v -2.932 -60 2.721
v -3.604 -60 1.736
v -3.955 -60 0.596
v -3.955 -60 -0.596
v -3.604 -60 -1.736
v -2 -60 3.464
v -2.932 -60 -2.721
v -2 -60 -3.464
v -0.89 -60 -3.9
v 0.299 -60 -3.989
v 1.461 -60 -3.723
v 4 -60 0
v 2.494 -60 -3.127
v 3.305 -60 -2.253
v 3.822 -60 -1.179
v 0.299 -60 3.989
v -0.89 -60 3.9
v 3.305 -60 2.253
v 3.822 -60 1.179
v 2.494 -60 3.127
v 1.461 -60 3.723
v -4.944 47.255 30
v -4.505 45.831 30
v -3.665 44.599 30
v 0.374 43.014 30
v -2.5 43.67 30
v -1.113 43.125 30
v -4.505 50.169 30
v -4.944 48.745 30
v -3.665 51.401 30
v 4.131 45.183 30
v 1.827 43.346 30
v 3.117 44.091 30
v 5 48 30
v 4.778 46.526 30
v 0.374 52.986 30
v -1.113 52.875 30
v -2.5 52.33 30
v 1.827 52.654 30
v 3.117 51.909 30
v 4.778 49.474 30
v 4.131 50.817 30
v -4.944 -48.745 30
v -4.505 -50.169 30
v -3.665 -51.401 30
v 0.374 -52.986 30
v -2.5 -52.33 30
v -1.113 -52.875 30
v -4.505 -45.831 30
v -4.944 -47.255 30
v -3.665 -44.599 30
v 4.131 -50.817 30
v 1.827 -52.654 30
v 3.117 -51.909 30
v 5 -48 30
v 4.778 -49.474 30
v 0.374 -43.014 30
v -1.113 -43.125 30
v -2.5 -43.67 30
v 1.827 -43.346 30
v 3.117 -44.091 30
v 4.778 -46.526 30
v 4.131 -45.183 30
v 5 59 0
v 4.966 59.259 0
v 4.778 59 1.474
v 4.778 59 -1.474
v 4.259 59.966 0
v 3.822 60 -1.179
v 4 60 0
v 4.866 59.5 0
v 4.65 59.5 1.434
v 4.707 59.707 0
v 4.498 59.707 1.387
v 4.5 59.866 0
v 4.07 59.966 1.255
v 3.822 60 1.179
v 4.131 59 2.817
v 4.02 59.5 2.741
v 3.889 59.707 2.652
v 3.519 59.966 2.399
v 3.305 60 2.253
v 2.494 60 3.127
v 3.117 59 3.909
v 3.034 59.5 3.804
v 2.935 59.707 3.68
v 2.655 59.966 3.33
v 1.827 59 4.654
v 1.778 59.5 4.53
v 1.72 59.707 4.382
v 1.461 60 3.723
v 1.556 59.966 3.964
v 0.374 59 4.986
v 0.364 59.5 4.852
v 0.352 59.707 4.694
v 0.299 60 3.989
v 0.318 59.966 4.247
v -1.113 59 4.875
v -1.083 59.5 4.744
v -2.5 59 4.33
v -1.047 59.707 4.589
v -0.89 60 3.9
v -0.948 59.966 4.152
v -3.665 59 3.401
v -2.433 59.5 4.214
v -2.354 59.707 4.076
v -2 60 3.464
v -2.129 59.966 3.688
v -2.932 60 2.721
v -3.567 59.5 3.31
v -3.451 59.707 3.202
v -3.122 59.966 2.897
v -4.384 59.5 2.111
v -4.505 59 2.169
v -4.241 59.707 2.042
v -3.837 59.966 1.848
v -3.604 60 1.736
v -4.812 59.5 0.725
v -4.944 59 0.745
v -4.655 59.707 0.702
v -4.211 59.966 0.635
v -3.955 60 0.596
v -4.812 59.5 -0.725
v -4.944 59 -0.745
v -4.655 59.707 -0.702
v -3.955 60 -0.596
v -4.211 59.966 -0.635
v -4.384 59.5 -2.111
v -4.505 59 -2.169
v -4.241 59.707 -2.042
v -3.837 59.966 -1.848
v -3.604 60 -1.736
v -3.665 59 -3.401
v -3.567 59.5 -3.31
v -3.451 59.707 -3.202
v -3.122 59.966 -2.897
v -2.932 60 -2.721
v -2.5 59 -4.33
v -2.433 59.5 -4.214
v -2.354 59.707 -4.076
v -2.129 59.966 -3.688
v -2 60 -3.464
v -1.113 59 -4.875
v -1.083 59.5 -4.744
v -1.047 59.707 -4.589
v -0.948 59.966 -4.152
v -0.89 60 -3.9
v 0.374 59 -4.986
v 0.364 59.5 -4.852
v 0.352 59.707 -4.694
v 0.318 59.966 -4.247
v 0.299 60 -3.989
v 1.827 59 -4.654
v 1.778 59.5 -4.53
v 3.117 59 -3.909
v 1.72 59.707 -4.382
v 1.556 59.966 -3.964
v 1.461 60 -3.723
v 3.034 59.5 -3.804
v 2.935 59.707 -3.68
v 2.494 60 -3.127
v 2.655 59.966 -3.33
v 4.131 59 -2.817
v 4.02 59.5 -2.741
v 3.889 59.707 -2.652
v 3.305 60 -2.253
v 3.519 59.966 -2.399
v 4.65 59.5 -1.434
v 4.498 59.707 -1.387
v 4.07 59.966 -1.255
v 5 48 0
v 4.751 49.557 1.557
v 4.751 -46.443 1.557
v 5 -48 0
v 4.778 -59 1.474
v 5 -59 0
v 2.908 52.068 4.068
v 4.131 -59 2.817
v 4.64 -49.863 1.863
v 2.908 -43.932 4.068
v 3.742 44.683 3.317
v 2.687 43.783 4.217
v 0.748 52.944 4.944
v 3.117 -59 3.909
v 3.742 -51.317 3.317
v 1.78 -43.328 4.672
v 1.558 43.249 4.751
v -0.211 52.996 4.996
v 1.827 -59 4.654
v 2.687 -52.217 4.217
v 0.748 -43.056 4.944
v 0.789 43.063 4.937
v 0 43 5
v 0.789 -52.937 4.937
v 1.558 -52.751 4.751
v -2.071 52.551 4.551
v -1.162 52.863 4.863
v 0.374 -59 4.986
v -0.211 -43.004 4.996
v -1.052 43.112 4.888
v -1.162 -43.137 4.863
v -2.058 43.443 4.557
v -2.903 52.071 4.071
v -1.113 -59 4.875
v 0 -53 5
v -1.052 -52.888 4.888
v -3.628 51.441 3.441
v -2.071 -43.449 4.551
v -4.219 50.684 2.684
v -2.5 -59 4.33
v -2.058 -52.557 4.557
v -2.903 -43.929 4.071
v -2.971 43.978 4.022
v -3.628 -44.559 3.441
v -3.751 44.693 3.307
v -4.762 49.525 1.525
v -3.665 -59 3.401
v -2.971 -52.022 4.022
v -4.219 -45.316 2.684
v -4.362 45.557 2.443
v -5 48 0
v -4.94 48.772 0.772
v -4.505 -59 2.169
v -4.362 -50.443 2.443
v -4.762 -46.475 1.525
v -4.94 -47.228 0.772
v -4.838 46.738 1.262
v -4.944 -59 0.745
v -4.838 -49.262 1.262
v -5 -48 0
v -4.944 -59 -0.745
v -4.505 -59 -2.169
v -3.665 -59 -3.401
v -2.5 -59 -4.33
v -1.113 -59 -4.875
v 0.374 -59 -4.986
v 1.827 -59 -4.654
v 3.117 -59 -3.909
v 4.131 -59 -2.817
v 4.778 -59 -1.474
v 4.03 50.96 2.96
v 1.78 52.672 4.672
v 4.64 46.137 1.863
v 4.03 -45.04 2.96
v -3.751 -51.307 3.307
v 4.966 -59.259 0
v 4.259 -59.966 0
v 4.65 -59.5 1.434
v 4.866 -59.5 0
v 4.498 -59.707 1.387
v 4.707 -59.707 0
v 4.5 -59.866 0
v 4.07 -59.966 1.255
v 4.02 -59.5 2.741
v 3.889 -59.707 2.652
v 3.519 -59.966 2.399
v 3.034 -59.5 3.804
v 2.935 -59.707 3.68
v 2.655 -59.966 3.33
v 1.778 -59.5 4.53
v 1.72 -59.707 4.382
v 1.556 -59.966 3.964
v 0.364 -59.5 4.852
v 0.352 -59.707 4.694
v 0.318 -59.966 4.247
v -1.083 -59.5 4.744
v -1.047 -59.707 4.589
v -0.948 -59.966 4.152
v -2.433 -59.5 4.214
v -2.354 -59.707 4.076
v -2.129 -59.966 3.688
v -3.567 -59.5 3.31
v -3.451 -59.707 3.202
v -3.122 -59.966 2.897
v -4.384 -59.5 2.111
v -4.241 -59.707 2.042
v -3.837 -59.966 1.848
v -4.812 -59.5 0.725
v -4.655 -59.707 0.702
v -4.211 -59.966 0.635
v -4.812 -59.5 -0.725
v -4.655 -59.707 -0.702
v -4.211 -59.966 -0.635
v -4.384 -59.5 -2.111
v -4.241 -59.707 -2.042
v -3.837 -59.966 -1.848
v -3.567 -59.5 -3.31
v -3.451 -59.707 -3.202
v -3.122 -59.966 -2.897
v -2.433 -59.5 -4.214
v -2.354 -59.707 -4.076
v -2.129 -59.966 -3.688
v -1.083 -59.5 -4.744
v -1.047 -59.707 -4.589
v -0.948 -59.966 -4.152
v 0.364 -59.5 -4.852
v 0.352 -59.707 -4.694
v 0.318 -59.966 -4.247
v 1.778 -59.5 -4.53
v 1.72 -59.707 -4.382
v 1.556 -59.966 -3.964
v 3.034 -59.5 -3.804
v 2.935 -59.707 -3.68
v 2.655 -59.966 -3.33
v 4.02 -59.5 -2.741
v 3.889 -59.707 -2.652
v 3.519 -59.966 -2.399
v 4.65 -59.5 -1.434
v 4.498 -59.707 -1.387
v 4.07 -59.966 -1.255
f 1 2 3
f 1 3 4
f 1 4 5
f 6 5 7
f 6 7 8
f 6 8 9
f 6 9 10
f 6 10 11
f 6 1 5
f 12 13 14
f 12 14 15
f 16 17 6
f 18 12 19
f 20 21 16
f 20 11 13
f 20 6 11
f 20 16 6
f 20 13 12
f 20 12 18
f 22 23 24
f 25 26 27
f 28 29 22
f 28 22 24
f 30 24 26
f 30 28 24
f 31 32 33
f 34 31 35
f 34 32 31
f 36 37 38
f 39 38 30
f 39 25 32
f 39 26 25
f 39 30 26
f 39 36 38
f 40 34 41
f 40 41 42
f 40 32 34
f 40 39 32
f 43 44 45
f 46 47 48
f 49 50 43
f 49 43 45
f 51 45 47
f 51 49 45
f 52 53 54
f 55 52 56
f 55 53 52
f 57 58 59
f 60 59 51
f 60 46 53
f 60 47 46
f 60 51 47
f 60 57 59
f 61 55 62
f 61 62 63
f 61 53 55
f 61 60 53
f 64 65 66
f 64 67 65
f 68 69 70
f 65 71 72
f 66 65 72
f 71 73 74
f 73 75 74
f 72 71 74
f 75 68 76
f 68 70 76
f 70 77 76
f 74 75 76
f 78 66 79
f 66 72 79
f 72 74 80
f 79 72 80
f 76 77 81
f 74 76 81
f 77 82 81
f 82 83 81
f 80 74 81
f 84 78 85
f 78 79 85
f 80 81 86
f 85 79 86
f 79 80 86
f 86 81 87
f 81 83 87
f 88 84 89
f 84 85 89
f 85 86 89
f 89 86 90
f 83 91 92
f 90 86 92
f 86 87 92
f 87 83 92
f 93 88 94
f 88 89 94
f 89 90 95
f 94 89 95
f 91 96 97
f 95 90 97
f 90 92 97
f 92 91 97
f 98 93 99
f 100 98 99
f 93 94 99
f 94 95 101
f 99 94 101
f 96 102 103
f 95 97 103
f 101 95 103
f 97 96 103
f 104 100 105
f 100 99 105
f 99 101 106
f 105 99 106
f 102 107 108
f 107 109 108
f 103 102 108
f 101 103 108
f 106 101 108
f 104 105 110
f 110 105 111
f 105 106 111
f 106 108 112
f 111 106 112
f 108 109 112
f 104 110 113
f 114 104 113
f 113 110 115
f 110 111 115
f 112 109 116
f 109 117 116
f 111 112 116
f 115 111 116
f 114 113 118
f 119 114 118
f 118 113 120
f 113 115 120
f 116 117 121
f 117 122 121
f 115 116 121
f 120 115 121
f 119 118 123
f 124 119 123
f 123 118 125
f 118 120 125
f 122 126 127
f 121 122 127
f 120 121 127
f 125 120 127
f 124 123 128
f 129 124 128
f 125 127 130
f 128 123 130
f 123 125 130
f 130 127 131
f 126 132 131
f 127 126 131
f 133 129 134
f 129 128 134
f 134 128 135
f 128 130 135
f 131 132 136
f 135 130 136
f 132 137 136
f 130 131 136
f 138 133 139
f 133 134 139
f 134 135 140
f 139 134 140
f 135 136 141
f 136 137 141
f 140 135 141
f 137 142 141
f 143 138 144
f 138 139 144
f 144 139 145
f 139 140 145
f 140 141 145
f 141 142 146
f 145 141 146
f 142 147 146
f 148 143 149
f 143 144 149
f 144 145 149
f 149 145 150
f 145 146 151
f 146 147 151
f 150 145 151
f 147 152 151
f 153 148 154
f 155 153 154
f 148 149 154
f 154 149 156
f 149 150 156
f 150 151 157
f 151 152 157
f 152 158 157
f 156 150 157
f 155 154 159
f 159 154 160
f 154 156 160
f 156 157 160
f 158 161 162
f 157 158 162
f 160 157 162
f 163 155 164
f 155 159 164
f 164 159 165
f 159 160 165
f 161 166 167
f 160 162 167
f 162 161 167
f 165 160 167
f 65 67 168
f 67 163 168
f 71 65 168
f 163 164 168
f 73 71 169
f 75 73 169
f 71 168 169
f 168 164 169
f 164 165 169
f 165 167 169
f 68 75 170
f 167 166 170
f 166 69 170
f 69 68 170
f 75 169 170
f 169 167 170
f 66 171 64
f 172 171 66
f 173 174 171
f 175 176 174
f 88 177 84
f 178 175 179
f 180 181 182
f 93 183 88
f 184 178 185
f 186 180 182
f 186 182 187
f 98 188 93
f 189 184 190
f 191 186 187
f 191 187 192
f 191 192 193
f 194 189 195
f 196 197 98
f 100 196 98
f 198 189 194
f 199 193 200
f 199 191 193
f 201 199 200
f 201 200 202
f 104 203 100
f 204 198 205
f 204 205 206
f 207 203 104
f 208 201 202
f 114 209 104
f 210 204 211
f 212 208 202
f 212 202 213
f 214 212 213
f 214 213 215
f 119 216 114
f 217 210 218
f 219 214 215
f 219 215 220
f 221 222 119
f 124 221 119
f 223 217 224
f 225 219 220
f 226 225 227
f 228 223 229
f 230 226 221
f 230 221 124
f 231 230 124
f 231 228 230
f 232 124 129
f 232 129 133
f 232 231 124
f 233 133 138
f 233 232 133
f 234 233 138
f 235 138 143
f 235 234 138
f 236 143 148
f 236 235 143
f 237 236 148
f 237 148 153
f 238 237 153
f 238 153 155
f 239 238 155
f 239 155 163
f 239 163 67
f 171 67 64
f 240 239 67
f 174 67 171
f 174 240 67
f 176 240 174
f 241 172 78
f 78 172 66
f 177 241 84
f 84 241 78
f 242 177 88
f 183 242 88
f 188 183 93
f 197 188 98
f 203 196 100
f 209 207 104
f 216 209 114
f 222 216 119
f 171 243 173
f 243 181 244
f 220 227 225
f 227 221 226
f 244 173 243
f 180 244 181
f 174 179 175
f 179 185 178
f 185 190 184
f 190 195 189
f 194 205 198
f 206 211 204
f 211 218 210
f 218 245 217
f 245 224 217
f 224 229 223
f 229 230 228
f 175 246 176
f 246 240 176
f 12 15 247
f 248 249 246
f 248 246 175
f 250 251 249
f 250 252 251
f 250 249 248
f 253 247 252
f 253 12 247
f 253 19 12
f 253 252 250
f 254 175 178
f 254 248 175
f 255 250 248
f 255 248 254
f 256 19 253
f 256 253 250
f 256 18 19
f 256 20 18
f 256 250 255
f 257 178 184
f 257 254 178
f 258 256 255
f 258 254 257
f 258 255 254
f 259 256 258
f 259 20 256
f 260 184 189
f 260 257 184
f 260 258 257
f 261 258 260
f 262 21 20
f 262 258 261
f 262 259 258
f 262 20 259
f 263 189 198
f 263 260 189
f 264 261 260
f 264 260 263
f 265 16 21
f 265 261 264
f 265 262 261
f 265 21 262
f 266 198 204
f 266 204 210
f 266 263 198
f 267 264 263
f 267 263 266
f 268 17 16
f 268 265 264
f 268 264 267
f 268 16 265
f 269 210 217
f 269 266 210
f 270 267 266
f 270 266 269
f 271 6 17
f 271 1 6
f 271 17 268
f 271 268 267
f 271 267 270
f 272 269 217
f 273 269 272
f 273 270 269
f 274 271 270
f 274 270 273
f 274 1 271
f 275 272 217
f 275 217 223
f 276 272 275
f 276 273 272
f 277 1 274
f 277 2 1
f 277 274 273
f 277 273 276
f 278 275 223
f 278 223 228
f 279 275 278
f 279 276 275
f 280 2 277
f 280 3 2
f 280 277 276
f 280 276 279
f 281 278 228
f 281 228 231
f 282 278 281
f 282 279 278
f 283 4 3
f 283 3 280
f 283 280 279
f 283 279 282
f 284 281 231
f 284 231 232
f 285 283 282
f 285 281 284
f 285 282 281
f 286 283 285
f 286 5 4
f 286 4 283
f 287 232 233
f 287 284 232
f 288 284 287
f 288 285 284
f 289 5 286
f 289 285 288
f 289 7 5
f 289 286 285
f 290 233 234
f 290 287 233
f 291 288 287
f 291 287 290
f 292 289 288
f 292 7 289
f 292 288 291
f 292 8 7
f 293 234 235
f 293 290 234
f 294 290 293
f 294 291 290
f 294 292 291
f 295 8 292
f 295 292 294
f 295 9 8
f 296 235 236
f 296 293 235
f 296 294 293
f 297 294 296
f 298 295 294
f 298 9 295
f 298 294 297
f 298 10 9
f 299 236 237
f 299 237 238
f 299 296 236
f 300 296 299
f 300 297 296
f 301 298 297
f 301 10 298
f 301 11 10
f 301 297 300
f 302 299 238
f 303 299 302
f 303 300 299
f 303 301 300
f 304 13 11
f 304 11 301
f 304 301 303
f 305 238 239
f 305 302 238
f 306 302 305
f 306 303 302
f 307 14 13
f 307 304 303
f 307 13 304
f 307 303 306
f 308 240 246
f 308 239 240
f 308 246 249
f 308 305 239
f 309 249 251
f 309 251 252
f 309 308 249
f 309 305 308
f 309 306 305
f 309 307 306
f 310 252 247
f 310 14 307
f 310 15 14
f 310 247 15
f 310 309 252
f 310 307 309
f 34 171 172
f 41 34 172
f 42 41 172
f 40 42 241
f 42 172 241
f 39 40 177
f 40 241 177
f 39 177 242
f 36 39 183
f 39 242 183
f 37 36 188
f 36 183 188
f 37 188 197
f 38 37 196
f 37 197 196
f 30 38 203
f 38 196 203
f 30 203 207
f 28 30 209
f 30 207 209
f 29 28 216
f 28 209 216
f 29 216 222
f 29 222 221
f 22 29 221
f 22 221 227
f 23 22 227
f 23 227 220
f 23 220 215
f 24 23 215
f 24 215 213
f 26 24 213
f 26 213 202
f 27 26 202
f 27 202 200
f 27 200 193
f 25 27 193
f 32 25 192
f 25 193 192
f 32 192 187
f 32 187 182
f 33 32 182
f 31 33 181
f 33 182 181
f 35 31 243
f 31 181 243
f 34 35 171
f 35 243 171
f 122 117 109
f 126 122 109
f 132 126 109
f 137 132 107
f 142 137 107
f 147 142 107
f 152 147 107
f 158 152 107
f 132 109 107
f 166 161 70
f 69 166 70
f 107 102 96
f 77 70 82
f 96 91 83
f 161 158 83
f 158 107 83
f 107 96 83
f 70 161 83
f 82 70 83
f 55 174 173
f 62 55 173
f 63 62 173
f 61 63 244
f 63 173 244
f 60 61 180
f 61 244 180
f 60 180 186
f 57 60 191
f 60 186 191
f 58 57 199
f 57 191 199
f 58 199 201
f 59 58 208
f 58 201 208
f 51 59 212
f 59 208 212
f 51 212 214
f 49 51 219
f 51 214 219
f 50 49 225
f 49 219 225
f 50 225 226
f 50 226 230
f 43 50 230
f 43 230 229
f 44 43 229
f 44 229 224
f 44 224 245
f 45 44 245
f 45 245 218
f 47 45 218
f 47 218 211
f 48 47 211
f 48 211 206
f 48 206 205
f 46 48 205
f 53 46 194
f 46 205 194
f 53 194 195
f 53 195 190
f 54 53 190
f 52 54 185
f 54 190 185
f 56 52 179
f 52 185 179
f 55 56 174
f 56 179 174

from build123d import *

# Parameters (mm, degrees)
F0_R     = 5
F1_DEPTH = 60
F2_R     = 5
F3_DEPTH = 30
F4_R     = 1


with BuildPart() as f1:
    # F0 (on Front) → F1 (new body, symmetric)
    with BuildSketch(Plane.XZ):
        Circle(F0_R)
    extrude(amount=F1_DEPTH, both=True)

    # F2 (on Top) → F3 (join)
    with BuildSketch(Plane.XY):
        with Locations((0, 48)):
            Circle(F2_R)
        with Locations((0, -48)):
            Circle(F2_R)
    extrude(amount=F3_DEPTH)

    # F4
    f4_edges = [f1.edges().sort_by_distance(p)[0] for p in [
        (-5, 60, 0),
        (-5, -60, 0),
    ]]
    fillet(f4_edges, radius=F4_R)


solid = f1.part
